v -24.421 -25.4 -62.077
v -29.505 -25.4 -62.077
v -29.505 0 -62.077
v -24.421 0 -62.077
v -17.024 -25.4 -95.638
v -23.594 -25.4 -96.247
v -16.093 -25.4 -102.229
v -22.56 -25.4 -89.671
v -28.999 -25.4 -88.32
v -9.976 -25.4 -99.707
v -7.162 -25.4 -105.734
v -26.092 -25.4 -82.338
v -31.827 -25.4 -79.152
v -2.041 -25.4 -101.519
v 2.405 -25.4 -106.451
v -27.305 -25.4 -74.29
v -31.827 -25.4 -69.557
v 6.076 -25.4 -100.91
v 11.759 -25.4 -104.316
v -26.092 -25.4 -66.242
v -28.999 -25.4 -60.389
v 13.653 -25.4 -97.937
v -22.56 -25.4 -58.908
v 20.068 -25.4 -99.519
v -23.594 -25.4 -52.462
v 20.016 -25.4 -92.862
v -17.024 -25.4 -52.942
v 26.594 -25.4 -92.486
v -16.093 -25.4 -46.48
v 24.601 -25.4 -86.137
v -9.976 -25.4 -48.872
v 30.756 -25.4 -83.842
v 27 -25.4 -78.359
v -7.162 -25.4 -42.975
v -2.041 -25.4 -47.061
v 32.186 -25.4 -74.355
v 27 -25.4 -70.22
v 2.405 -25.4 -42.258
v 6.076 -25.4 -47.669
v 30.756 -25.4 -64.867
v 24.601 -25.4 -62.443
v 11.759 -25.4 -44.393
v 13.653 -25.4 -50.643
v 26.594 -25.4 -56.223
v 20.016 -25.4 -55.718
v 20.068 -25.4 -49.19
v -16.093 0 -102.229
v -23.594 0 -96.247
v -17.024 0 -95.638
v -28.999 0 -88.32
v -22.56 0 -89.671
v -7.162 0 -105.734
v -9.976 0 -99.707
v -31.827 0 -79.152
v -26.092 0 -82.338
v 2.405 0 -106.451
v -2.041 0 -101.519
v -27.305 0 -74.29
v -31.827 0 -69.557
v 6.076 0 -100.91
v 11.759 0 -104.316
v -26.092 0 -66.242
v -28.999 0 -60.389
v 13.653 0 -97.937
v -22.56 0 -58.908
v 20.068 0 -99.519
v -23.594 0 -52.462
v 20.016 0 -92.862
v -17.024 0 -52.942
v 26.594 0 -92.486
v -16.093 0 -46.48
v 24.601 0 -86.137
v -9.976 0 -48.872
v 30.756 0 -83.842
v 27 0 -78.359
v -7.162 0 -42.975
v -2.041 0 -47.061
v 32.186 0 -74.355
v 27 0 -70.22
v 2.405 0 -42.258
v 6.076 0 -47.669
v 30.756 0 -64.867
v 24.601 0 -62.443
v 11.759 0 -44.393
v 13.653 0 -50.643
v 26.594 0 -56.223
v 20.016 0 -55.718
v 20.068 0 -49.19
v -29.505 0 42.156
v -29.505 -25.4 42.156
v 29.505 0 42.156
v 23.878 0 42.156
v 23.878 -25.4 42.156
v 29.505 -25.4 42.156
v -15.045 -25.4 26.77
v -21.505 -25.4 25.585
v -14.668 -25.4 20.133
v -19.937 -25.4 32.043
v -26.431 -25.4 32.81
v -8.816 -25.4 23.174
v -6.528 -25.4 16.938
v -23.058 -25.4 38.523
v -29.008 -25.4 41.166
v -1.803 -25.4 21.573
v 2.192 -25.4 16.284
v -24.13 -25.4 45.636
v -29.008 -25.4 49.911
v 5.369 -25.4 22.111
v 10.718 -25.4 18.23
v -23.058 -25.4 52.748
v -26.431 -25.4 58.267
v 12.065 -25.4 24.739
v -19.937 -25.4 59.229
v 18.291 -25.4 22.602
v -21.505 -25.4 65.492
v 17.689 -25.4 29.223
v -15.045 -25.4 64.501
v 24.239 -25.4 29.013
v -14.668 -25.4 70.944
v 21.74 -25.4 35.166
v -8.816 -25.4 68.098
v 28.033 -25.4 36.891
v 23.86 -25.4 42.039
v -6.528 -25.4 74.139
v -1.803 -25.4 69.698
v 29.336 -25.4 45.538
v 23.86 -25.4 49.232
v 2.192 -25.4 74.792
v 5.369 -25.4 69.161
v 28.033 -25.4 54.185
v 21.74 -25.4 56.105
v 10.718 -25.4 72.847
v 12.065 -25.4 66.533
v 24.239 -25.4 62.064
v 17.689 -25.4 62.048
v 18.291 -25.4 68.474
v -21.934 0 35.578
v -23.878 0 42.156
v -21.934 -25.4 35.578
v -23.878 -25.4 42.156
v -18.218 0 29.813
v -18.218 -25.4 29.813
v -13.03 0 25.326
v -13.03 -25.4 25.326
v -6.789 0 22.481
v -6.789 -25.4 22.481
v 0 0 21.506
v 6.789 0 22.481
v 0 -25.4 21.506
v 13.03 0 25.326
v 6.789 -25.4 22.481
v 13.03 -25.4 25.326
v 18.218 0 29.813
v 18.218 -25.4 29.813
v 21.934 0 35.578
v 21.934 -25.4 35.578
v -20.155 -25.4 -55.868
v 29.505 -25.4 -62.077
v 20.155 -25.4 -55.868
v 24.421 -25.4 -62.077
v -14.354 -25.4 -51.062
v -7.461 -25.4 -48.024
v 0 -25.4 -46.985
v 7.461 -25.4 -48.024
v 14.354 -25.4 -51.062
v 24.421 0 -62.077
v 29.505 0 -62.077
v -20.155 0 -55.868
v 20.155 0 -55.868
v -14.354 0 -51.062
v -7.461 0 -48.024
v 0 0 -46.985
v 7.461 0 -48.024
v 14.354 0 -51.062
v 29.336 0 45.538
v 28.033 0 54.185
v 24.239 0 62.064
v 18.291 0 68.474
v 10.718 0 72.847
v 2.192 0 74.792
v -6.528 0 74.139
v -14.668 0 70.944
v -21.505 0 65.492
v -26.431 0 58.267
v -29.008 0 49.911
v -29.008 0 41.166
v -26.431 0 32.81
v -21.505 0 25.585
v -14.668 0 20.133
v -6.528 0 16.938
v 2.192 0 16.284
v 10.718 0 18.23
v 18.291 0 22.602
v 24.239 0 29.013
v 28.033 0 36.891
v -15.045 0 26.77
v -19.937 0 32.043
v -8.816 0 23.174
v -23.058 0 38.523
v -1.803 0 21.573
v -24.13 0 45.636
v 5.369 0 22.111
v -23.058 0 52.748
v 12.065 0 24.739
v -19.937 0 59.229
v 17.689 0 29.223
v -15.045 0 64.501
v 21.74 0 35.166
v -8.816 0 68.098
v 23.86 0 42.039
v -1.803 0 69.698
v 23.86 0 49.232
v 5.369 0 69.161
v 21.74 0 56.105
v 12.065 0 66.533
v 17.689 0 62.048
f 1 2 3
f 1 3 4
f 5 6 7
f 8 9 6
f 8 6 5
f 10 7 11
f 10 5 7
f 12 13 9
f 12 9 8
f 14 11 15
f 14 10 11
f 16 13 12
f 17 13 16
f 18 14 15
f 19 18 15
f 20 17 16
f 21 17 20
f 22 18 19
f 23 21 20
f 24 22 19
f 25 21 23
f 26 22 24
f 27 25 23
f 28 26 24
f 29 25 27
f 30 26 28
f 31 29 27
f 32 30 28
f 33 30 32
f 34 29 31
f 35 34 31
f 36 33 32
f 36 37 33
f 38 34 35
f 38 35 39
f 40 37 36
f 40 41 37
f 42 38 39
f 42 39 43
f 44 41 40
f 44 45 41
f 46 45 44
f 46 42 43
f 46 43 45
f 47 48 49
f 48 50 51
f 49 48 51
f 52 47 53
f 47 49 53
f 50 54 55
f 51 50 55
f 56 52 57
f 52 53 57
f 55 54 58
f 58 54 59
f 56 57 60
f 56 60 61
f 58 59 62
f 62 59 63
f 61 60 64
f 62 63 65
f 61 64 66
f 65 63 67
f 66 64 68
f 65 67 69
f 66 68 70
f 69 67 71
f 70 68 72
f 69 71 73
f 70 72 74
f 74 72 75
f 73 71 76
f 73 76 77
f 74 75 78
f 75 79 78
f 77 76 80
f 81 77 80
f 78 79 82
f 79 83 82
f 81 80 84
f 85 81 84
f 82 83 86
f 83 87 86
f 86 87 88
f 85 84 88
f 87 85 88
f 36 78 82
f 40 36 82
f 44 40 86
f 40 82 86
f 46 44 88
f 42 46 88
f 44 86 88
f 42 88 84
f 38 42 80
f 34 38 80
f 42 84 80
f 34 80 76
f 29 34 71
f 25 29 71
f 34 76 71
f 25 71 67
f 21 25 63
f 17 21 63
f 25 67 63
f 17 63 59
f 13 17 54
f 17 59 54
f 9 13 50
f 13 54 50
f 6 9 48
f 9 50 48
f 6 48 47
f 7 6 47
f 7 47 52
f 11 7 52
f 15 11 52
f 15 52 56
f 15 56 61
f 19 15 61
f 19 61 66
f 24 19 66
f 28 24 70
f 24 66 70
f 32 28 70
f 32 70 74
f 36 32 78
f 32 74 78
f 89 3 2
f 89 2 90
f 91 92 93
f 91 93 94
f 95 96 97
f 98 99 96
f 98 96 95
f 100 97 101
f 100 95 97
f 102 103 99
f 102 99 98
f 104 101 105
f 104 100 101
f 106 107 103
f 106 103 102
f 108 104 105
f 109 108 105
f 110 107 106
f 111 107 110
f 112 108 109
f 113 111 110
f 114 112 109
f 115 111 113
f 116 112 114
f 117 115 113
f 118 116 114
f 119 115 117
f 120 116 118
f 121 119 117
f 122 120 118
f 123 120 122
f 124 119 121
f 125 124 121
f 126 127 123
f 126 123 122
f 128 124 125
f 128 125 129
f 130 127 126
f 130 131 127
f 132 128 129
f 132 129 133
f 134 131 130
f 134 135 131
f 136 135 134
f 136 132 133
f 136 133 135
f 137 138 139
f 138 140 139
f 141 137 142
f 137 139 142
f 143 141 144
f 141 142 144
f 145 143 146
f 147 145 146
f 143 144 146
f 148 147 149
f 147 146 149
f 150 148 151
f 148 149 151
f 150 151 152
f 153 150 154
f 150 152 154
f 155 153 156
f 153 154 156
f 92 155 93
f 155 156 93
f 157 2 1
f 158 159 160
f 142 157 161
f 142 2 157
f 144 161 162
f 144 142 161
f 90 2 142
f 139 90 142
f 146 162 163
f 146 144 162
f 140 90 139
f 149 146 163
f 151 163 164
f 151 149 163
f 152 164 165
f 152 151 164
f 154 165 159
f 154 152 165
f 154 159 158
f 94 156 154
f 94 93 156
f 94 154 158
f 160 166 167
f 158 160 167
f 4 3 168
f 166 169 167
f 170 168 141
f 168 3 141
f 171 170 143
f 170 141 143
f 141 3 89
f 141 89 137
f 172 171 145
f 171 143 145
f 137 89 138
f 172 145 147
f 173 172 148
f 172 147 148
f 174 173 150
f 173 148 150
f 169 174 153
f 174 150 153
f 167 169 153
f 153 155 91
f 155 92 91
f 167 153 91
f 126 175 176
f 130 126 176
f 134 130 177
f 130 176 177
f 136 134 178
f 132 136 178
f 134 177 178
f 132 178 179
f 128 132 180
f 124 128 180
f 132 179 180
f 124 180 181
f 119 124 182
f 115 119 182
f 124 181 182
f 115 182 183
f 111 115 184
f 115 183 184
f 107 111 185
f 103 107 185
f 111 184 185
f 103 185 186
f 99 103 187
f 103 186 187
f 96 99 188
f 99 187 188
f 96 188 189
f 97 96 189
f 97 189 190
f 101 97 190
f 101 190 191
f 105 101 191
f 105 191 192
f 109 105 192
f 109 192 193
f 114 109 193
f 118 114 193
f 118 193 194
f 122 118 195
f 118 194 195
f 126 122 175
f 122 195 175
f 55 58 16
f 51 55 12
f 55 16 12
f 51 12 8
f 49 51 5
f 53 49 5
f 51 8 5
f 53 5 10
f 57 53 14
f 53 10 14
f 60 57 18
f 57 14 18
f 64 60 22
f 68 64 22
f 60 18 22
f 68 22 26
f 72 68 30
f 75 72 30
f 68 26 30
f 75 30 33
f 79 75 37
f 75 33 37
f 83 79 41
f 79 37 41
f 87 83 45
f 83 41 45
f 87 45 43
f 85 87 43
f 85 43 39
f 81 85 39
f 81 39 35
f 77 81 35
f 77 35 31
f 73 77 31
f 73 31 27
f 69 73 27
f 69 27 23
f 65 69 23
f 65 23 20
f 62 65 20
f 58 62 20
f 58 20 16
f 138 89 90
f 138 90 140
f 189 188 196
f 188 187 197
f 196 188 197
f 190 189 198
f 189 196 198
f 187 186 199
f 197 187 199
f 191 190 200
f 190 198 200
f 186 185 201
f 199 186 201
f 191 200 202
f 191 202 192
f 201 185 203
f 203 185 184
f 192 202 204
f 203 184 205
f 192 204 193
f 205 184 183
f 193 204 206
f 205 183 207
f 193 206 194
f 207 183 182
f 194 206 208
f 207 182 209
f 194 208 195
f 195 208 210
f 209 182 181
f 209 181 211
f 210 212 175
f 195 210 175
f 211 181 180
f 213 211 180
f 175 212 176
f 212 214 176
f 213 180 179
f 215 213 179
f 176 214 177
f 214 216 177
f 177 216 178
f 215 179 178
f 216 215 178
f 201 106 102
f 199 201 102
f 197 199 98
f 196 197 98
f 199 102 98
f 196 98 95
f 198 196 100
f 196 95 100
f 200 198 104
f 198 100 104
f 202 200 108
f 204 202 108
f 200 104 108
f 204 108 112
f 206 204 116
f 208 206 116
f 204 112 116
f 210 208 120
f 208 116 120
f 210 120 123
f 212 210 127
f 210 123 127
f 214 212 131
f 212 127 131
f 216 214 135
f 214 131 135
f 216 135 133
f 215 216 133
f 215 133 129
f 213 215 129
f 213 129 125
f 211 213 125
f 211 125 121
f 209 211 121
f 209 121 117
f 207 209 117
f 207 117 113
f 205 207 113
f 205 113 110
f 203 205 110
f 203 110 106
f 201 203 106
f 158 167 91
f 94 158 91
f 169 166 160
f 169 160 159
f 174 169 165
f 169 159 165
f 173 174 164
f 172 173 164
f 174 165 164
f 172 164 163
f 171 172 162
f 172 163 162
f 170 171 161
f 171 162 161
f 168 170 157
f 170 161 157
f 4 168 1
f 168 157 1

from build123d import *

# Parameters (mm, degrees)
F0_R     = 29.3360795895
F3_DEPTH = 25.4
F0_R_2   = 32.1864241751
F1_W     = 59.0107068419
F1_H     = 104.2327992618
F5_D     = 54.61
F5_2_D   = 54.61
F6_D     = 48.26
F6_2_D   = 48.26


with BuildPart() as f3:
    # F0 (on Front) → F3 (new body)
    with BuildSketch(Plane.XZ):
        with Locations((0, 45.5383509398)):
            Circle(F0_R)
    extrude(amount=F3_DEPTH)

    # F6 (through all)
    with Locations(Plane(origin=(0, 0, 0), x_dir=(1, 0, 0), z_dir=(0, 1, 0))):
        with Locations((0, -45.6358604133)):
            Hole(F6_D / 2)


with BuildPart() as f3b:
    # F0 (on Front) → F3, piece 2 (new body)
    with BuildSketch(Plane.XZ):
        with Locations((0, -74.354544282)):
            Circle(F0_R_2)
    extrude(amount=F3_DEPTH)

    # F5 (through all)
    with Locations(Plane(origin=(0, 0, 0), x_dir=(1, 0, 0), z_dir=(0, 1, 0))):
        with Locations((0, 74.289880693)):
            Hole(F5_D / 2)


with BuildPart() as f3c:
    # F1 (on Front) → F3, piece 3 (new body)
    with BuildSketch(Plane.XZ):
        with Locations((0, -9.9603179842)):
            Rectangle(F1_W, F1_H)
    extrude(amount=F3_DEPTH)

    # F5#2 (through all)
    with Locations(Plane(origin=(0, 0, 0), x_dir=(1, 0, 0), z_dir=(0, 1, 0))):
        with Locations((0, 74.289880693)):
            Hole(F5_2_D / 2)

    # F6#2 (through all)
    with Locations(Plane(origin=(0, 0, 0), x_dir=(1, 0, 0), z_dir=(0, 1, 0))):
        with Locations((0, -45.6358604133)):
            Hole(F6_2_D / 2)


solid = Compound([f3.part, f3b.part, f3c.part])
